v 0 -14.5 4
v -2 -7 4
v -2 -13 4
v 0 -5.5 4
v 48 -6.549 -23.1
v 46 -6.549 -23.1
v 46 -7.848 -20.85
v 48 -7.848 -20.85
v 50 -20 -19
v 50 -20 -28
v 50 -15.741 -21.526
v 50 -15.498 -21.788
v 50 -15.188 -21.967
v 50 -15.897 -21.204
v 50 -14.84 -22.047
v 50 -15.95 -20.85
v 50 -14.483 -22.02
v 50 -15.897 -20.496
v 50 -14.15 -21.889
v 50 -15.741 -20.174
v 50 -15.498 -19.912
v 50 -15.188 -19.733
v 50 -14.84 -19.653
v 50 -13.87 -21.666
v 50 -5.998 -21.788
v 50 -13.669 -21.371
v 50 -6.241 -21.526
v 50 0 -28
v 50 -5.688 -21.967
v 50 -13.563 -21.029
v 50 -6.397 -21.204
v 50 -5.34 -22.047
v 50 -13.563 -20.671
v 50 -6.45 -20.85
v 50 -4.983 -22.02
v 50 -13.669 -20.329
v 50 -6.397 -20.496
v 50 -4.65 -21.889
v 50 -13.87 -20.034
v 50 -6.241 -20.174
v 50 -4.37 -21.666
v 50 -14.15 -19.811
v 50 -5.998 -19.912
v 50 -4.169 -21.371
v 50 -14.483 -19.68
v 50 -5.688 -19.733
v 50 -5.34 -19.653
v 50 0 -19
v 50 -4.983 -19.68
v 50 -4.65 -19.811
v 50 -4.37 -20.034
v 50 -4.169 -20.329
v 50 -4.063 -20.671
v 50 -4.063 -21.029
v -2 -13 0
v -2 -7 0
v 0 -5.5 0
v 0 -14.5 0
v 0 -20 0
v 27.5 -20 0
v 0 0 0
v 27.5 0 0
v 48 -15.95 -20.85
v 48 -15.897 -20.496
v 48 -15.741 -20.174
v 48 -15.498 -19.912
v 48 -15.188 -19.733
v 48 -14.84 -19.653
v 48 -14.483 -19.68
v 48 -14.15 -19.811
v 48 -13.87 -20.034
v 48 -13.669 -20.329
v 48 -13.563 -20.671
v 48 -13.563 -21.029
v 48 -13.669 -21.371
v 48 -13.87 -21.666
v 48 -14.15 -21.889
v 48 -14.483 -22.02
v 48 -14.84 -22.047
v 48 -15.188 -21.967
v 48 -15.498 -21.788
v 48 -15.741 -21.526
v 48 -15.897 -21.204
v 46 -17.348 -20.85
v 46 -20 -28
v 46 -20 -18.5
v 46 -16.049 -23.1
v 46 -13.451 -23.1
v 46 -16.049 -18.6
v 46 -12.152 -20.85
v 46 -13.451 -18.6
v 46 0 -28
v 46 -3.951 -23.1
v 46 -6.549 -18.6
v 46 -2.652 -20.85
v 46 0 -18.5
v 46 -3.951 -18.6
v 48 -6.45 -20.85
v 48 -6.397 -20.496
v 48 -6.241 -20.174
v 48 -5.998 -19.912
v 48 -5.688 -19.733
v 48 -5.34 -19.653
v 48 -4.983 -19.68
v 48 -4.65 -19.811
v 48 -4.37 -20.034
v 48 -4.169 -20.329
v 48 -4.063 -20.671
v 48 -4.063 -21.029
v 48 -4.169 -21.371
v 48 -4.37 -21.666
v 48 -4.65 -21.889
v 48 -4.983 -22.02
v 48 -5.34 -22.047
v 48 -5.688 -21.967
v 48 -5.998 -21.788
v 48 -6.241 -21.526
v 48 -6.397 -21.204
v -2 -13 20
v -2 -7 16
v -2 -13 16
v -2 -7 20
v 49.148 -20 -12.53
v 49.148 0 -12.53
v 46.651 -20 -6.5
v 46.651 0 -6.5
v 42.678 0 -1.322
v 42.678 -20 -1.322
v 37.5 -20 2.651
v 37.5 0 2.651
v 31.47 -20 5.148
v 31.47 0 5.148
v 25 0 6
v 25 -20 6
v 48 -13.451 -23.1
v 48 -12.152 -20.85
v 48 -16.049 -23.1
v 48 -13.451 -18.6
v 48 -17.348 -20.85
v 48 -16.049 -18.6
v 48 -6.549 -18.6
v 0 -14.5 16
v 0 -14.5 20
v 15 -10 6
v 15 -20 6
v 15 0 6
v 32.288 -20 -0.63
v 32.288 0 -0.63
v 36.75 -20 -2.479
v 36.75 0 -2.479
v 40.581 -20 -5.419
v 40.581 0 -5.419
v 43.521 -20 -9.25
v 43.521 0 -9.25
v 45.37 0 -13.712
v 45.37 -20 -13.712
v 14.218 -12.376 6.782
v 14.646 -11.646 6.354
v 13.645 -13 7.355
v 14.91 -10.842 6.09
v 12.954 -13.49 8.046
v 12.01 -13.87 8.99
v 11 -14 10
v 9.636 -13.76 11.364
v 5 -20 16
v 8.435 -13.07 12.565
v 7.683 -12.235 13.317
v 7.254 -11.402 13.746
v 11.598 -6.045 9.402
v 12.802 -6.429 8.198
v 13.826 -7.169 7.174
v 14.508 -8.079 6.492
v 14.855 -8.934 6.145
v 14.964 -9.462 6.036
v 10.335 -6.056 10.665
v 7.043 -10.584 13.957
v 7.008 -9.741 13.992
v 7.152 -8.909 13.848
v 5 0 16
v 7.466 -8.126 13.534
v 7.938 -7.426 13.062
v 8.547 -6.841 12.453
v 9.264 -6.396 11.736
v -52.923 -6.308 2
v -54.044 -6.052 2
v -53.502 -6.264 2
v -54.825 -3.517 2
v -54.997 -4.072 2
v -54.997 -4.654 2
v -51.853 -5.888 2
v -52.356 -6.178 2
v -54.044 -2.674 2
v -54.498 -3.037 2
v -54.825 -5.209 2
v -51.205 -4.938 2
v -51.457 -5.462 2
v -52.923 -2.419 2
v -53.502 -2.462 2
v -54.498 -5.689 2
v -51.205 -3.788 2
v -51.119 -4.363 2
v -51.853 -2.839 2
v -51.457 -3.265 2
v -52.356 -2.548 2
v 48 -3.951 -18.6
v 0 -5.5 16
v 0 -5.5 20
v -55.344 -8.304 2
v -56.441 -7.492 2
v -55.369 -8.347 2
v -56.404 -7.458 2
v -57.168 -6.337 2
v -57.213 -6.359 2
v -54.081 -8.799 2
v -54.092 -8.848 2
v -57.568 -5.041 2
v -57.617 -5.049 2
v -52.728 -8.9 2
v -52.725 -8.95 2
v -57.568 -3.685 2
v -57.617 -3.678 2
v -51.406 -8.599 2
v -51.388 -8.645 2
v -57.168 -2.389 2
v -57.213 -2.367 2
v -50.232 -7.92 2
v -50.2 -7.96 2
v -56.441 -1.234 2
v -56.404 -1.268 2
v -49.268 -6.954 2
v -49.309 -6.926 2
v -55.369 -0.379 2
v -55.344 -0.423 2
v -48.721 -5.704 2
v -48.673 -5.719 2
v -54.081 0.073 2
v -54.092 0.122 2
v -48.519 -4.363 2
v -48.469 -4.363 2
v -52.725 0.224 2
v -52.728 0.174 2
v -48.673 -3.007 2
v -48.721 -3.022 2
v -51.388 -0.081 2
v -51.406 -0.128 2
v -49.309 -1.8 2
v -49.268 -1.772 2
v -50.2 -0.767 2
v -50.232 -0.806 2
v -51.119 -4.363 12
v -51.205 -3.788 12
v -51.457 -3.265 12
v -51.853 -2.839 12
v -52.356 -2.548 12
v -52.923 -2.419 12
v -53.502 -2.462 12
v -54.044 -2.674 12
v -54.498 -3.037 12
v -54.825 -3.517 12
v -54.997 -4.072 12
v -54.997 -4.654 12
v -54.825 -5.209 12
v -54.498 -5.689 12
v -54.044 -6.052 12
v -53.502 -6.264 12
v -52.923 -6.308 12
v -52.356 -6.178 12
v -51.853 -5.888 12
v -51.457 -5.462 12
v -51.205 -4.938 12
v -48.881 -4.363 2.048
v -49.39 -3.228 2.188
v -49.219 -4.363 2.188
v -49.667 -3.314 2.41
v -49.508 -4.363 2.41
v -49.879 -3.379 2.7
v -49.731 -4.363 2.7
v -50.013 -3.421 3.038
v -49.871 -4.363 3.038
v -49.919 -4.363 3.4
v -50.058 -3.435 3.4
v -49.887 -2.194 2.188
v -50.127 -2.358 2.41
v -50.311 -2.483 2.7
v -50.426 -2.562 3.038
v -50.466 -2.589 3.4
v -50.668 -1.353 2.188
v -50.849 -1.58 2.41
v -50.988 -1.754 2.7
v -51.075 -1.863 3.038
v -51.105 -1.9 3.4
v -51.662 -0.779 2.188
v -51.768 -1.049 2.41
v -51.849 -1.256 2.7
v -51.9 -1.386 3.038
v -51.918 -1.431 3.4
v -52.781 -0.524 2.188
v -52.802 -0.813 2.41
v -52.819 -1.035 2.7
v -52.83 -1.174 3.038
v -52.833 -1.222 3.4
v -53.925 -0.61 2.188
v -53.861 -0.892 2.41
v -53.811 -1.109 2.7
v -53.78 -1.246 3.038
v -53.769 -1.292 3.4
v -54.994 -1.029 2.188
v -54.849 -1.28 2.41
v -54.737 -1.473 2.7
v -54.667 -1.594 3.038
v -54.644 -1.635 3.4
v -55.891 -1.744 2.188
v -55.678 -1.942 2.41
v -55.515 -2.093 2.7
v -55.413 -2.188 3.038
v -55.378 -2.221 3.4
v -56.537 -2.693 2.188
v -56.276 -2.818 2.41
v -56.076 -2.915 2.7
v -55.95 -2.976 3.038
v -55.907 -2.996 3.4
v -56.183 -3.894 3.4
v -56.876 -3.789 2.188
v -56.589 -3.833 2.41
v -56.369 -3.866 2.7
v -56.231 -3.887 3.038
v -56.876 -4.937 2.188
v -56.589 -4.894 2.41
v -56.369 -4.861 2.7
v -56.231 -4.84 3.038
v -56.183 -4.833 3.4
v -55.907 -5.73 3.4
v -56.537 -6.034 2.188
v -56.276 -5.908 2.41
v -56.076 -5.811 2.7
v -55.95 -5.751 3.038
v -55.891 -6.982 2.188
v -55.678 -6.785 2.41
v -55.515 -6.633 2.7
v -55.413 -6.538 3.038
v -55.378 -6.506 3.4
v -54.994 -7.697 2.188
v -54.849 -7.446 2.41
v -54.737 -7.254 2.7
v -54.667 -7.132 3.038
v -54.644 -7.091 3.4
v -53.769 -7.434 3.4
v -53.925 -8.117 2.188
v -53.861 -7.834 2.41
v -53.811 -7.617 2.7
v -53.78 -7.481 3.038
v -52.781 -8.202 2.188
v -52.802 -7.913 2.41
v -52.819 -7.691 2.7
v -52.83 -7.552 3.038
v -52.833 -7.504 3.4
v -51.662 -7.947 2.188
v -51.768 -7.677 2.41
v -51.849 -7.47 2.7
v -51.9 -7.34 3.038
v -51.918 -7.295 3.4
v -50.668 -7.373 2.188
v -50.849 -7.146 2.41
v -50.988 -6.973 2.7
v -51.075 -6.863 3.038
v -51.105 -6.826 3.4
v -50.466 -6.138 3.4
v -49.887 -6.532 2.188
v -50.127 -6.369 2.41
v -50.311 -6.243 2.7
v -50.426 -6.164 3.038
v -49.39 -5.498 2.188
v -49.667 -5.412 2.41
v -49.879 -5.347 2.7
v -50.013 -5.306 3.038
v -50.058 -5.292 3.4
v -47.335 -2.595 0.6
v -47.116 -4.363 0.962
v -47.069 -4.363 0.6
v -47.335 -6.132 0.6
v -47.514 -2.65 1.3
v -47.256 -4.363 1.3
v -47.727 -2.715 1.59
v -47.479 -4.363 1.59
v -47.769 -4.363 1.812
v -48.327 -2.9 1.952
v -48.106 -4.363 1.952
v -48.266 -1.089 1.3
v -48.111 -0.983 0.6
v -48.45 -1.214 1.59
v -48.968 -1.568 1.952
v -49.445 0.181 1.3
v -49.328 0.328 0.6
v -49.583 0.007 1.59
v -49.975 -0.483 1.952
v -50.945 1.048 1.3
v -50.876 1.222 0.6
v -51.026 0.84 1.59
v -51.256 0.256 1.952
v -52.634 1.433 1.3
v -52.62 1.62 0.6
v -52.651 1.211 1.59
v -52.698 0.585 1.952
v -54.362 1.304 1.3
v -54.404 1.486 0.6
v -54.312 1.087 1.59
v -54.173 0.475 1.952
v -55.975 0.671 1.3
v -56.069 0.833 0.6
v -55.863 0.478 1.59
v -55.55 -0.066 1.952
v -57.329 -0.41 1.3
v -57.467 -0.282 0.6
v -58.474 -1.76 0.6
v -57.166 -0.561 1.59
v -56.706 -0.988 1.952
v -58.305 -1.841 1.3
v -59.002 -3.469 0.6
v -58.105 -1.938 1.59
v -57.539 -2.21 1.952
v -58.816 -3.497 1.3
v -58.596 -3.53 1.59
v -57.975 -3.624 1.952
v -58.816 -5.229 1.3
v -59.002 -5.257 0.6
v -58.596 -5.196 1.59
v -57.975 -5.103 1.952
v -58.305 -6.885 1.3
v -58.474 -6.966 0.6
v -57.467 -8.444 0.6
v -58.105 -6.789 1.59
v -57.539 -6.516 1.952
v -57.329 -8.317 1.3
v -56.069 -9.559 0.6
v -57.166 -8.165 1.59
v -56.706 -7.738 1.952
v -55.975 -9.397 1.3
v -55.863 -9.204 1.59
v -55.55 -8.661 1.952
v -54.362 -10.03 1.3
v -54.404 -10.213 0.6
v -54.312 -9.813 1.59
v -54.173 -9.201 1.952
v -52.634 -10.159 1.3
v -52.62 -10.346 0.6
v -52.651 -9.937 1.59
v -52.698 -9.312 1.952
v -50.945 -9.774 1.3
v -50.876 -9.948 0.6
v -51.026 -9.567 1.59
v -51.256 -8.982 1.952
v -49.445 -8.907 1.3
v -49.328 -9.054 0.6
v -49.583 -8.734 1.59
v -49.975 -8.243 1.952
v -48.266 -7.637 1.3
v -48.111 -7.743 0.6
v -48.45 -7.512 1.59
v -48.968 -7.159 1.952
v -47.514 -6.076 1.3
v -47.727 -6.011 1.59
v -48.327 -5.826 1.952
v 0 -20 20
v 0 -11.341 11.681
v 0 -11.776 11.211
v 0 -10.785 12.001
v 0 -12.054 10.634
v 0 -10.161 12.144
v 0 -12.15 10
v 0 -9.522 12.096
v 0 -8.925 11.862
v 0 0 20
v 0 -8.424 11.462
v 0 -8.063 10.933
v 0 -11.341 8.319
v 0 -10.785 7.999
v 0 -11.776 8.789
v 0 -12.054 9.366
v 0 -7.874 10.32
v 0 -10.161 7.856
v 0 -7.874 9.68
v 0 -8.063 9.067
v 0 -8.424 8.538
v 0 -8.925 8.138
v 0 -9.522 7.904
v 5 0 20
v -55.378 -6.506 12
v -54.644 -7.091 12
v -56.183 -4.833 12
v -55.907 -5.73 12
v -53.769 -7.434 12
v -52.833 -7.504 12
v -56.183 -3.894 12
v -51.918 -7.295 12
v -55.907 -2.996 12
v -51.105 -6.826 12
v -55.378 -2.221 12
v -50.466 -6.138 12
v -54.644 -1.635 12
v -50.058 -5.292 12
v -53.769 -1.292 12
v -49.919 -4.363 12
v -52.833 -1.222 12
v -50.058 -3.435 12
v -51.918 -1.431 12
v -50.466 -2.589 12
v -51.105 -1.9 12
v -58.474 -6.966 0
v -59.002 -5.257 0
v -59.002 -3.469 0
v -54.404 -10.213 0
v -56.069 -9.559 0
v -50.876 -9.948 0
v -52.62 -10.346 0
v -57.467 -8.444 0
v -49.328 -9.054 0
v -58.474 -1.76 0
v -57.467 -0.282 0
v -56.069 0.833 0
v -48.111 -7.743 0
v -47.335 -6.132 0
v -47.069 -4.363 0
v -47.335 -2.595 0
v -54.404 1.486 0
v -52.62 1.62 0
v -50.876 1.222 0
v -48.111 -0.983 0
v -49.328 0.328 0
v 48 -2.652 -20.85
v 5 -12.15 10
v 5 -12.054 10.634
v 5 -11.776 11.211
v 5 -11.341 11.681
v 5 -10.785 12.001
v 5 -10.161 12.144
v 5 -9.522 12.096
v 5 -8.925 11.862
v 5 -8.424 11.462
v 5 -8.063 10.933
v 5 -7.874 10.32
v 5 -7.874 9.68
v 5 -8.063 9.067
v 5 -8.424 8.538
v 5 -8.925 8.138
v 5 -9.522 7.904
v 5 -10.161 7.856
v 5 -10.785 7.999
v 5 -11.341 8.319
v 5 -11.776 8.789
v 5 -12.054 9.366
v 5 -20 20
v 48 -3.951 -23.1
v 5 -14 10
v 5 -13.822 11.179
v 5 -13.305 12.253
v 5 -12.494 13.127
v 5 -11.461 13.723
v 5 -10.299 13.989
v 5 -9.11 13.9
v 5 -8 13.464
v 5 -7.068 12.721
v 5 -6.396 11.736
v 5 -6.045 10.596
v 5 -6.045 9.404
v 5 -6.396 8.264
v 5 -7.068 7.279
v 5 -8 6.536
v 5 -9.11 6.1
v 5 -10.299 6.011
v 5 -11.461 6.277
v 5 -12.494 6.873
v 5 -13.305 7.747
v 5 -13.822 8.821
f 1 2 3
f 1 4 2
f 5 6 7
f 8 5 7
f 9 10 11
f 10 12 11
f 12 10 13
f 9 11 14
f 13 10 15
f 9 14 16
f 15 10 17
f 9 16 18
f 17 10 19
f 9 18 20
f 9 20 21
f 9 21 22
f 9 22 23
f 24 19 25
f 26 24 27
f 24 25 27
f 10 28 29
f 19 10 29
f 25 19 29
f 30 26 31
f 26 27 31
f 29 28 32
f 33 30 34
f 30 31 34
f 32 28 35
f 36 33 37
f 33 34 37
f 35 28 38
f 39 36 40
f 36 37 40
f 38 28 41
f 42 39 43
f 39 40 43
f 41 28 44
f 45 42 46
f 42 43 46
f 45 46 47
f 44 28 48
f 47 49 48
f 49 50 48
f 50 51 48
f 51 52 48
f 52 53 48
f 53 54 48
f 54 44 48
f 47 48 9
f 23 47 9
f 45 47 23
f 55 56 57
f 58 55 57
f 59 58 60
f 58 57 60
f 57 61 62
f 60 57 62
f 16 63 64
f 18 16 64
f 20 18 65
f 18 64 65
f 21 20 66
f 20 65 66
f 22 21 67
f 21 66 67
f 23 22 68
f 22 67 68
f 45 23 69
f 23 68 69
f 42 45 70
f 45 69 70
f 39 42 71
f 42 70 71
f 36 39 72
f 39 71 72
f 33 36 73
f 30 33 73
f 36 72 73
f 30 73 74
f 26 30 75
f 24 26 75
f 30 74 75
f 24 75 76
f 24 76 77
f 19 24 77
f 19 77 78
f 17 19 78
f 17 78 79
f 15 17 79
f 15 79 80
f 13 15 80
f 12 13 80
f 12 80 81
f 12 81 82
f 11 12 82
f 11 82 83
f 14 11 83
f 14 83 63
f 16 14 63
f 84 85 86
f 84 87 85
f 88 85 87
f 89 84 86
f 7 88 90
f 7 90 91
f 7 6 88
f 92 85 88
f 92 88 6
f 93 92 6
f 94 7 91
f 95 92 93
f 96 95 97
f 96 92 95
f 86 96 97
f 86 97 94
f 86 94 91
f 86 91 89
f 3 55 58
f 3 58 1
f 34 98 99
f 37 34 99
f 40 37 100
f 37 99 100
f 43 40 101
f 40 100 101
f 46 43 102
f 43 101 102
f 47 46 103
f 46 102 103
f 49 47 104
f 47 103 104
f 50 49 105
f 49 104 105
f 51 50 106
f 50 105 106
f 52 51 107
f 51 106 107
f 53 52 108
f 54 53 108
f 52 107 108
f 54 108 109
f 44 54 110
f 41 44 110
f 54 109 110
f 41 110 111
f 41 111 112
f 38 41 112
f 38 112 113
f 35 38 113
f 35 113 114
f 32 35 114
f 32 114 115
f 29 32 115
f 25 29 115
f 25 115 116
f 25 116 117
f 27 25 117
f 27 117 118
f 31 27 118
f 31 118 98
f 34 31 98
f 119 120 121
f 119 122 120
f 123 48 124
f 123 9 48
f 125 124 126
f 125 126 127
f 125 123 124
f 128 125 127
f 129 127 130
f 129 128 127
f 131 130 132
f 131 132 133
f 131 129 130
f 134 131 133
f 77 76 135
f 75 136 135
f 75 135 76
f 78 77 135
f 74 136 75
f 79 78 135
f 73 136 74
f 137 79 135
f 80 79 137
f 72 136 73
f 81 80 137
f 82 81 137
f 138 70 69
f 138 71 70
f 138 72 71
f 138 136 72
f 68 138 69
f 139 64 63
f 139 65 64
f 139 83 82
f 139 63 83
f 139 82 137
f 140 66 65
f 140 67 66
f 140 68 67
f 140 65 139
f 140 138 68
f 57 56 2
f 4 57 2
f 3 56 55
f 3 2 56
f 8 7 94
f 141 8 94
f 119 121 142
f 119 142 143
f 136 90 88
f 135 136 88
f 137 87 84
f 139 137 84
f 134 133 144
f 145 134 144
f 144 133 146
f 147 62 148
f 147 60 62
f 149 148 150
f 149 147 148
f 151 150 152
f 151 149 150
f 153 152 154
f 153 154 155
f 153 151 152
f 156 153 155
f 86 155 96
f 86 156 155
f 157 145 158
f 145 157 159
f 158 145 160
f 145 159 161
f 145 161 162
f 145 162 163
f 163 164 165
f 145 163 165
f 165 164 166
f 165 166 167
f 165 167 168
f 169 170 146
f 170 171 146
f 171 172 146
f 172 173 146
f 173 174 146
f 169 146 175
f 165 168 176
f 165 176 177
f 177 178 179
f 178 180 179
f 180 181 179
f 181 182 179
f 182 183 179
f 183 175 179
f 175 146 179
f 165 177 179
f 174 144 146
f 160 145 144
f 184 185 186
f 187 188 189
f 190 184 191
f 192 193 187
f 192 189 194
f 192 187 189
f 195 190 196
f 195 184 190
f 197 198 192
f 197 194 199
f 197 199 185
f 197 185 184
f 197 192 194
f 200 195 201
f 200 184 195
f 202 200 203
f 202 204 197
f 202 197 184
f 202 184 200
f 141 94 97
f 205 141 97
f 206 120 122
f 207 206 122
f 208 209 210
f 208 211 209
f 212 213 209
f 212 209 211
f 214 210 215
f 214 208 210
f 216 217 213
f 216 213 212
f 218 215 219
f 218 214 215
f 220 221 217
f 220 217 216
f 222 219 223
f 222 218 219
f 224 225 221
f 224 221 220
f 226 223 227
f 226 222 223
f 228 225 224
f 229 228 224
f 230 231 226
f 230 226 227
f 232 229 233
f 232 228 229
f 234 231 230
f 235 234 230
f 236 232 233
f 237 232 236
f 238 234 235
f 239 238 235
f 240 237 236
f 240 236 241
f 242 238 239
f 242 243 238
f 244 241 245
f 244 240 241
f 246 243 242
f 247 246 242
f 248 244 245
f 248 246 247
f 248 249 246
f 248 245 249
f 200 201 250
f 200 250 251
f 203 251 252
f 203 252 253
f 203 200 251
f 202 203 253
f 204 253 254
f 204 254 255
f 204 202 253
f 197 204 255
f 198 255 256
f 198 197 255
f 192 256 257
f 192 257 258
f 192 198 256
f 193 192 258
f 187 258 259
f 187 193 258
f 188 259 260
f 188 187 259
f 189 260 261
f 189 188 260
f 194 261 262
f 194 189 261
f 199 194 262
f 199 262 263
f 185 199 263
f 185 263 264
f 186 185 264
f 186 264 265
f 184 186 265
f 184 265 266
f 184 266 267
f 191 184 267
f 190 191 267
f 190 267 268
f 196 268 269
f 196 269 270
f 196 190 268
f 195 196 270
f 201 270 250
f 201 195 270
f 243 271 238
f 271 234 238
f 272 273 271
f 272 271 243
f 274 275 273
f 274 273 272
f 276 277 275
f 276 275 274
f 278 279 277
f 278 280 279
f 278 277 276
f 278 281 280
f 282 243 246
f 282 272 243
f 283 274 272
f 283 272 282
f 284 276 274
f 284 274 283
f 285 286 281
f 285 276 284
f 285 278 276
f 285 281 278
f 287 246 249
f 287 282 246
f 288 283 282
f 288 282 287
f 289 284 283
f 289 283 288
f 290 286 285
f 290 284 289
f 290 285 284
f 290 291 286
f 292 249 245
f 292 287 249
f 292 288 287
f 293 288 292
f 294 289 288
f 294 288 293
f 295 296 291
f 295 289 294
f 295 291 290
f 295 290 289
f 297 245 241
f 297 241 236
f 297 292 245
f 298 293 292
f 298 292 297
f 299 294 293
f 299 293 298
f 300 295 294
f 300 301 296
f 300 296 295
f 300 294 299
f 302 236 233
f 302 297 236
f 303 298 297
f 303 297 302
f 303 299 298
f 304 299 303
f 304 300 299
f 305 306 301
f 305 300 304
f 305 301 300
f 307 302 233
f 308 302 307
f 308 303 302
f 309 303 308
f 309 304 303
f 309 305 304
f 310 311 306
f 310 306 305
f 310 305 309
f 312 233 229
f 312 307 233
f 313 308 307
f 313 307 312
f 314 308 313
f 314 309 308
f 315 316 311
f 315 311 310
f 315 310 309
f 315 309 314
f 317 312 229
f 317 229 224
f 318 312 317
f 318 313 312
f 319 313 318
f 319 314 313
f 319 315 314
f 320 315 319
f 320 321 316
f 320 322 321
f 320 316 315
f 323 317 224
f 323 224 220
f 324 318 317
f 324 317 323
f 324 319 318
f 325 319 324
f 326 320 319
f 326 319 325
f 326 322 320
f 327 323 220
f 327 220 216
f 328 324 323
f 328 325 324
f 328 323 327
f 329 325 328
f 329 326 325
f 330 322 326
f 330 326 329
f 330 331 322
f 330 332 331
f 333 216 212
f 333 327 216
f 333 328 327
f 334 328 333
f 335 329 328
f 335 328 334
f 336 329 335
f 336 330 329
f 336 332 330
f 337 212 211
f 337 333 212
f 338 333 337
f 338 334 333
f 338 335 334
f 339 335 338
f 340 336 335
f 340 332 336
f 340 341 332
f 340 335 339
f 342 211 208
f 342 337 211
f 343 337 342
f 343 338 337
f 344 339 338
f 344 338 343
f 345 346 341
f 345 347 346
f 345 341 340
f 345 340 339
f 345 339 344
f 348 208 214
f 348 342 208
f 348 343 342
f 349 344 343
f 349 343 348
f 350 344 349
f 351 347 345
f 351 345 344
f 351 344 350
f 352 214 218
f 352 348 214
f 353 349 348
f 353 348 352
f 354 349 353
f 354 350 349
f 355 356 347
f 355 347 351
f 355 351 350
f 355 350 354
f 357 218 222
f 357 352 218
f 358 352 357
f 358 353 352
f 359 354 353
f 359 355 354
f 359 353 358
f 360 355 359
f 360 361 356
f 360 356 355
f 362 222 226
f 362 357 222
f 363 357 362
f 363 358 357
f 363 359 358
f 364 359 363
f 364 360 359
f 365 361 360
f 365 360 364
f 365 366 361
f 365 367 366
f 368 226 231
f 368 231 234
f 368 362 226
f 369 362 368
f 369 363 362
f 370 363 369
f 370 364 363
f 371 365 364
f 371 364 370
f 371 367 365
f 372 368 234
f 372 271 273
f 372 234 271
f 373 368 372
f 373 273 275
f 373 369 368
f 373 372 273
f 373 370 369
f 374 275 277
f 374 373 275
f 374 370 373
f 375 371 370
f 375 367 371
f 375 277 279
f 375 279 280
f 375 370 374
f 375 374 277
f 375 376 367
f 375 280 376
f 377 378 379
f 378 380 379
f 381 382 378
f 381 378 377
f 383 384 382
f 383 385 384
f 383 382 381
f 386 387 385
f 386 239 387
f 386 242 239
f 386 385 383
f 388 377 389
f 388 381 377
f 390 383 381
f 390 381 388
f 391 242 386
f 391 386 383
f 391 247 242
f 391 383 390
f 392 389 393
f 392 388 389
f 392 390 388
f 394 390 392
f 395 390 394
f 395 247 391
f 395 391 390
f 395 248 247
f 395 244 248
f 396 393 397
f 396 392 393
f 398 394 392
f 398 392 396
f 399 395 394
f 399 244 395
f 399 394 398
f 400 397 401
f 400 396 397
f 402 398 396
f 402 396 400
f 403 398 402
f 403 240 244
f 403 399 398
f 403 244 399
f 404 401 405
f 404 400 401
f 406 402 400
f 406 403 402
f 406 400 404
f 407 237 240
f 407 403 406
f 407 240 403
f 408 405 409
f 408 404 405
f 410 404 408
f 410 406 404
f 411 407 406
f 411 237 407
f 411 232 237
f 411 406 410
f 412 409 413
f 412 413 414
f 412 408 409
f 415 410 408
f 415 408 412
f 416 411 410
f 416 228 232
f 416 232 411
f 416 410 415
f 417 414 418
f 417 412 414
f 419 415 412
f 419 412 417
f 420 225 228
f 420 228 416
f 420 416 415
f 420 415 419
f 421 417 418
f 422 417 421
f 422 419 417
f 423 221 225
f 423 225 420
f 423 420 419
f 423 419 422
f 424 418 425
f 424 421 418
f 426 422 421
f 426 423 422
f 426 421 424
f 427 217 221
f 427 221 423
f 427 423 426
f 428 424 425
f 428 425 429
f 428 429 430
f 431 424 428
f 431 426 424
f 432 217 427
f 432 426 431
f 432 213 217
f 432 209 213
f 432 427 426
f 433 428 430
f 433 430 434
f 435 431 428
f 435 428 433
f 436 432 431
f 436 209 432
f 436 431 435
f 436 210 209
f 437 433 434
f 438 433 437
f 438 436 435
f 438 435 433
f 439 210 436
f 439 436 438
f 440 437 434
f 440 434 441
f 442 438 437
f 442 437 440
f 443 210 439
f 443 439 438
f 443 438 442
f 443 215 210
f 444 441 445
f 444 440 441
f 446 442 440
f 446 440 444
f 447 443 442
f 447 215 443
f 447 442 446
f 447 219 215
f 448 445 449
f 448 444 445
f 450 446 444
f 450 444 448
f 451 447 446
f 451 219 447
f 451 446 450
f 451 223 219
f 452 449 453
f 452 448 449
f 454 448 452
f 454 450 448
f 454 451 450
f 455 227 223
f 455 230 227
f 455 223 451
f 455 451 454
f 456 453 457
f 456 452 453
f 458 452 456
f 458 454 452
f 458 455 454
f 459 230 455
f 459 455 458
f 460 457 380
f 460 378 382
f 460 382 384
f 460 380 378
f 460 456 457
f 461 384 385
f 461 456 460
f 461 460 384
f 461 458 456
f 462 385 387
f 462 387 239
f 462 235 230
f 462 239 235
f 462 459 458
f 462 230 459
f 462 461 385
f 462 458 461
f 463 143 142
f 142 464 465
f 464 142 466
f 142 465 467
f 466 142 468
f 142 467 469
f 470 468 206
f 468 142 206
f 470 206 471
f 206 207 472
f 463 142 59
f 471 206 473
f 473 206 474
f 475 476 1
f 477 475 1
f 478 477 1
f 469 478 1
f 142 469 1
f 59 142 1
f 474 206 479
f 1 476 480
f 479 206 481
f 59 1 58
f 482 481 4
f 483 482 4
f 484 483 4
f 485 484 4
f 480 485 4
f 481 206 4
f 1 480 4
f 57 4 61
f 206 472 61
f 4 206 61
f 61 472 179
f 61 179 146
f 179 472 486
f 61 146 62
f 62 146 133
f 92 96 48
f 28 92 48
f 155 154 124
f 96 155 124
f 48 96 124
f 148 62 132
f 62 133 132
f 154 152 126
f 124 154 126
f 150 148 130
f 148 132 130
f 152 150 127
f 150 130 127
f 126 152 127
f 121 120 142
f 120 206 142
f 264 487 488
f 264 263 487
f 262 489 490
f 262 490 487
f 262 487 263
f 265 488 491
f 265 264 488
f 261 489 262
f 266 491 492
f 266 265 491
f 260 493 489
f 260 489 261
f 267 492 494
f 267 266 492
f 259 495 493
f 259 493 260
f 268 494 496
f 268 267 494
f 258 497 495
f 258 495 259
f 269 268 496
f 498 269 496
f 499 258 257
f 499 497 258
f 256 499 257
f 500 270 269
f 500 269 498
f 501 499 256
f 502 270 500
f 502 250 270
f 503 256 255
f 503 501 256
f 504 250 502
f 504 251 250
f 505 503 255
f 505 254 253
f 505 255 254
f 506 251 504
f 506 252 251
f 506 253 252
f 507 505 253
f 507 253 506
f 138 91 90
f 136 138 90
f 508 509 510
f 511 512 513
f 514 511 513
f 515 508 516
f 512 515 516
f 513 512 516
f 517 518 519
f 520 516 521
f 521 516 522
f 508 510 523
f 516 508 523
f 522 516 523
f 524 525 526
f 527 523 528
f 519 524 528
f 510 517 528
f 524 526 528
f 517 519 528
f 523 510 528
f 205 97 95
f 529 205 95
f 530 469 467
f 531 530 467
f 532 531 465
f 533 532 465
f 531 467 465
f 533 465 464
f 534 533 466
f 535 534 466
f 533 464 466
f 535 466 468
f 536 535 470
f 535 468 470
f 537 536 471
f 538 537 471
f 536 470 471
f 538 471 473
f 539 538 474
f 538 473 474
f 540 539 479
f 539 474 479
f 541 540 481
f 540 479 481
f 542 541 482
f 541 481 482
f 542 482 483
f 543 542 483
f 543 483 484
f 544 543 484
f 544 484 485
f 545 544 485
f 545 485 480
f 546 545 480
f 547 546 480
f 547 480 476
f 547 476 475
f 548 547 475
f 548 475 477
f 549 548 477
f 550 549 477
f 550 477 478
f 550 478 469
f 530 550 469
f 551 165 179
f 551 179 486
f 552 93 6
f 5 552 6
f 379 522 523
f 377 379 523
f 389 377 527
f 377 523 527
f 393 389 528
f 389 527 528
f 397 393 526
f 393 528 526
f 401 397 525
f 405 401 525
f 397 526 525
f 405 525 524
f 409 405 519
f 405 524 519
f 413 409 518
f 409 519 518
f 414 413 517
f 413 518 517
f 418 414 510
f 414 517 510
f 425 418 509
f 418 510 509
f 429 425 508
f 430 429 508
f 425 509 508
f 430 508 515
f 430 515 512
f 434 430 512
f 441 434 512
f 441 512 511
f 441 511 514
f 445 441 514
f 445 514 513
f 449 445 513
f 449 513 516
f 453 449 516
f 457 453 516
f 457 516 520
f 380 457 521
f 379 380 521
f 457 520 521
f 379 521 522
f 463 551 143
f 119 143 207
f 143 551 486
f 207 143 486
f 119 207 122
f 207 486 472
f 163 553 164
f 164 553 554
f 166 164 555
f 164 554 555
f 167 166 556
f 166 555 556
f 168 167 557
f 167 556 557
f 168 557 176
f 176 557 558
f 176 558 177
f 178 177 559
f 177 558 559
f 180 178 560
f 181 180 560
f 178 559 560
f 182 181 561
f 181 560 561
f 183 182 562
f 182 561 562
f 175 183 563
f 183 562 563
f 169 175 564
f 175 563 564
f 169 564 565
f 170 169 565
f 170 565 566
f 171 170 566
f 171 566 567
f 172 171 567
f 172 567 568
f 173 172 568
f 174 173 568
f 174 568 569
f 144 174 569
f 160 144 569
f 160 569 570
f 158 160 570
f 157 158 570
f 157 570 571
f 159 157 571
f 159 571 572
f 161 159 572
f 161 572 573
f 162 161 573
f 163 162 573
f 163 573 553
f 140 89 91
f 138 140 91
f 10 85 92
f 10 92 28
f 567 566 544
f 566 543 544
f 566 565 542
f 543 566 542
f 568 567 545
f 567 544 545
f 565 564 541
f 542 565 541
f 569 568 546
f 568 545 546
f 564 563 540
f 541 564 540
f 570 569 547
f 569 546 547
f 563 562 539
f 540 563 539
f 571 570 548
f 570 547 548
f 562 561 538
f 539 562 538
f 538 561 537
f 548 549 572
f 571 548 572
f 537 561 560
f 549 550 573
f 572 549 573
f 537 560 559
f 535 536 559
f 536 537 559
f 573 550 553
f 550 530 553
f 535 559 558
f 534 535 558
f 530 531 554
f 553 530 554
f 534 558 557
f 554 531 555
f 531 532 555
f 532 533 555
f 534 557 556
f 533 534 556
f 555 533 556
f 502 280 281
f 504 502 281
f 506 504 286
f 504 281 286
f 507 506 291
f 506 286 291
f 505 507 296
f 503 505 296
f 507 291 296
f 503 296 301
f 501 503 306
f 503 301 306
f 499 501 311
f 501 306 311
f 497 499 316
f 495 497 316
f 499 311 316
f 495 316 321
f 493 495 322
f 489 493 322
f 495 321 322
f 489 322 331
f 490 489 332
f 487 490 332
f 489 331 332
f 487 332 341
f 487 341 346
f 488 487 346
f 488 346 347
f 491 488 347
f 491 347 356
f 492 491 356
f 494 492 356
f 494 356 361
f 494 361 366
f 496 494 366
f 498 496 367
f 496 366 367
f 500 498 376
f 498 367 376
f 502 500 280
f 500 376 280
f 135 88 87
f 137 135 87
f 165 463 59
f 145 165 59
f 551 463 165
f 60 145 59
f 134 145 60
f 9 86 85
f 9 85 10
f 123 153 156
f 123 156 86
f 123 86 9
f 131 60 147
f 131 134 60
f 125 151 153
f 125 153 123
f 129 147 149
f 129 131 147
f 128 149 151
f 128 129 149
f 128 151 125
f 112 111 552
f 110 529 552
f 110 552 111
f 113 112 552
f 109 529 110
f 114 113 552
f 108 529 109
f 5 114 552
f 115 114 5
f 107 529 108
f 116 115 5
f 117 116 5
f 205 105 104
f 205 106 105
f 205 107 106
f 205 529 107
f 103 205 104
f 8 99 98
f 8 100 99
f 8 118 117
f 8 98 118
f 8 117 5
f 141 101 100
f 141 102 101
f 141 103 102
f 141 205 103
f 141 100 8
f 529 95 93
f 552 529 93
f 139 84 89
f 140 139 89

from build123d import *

# Parameters (mm, degrees)
F0_W       = 4
F0_H       = 28
F1_DEPTH   = 20
F2_R       = 2.15
F3_DEPTH   = 50.001
F4_START   = -5
F2_R_2     = 4
F4_DEPTH   = 45.001
F6_D       = 2.4
F6_DEPTH   = 8
F6_TIP     = 0.7210327428
F2_W       = 9
F2_H       = 4
F7_DEPTH   = 2
F8_SIZE2   = 1.49999
F8_SIZE    = 1.99999
F8_2_SIZE2 = 1.49999
F8_2_SIZE  = 1.99999
F9_SIZE2   = 1.49999
F9_SIZE    = 1.99999
F9_2_SIZE2 = 1.49999
F9_2_SIZE  = 1.99999
F11_DEPTH  = 2
F12_R      = 18.5
F13_R      = 25
F14_R      = 6
F15_DEPTH  = 2
F16_R      = 3.15
F16_R_2    = 1.95
F17_DEPTH  = 10
F18_R      = 1.4


# Not quite as in the source:
# - a fillet or chamfer is up to 0.001 mm smaller than in the source, because OpenCascade refuses the exact size
# - a feature names something its author has since deleted; it is built from what else it names


with BuildPart() as f1:
    # F0 (on Front) → F1 (new body)
    with BuildSketch(Plane.XZ):
        Polygon((0, 20), (0, 0), (46, 0), (50, 0), (50, 6), (15, 6), (5, 16), (5, 20), align=None)
        with Locations((48, -14)):
            Rectangle(F0_W, F0_H)
    extrude(amount=F1_DEPTH)

    # F2 (on face) → F3 (cut, through all)
    with BuildSketch(Plane(origin=(0, 0, 0), x_dir=(0, -1, 0), z_dir=(-1, 0, 0))):
        with Locations((10, 10)):
            Circle(F2_R)
    extrude(amount=-F3_DEPTH, mode=Mode.SUBTRACT)

    # F2 (on face) → F4 (cut)
    with BuildSketch(Plane(origin=(0, 0, 0), x_dir=(0, -1, 0), z_dir=(-1, 0, 0)).offset(F4_START)):
        with Locations((10, 10)):
            Circle(F2_R_2)
        with Locations((10, 10)):
            Circle(F2_R, mode=Mode.SUBTRACT)
    extrude(amount=-F4_DEPTH, mode=Mode.SUBTRACT)

    # F6
    with Locations(Plane.YZ.offset(50)):
        with Locations((-14.75, -20.85), (-5.25, -20.85)):
            Hole(F6_D / 2, depth=F6_DEPTH)
            with Locations((0, 0, -(F6_DEPTH + F6_TIP / 2))):  # 118° drill point
                Cone(0, F6_D / 2, F6_TIP, mode=Mode.SUBTRACT)

    # F2 (on face) → F7 (join)
    with BuildSketch(Plane(origin=(0, 0, 0), x_dir=(0, -1, 0), z_dir=(-1, 0, 0))):
        with Locations((10, 2)):
            Rectangle(F2_W, F2_H)
        with Locations((10, 18)):
            Rectangle(F2_W, F2_H)
    extrude(amount=F7_DEPTH)

    # F8 (size 2 and 1.5 in the source; OpenCascade refuses exactly that, so slightly less here)
    f8_edges = [f1.edges().sort_by_distance(p)[0] for p in [
        (-2, -5.5, 2),
    ]]
    f8_side = f1.faces().sort_by_distance((-1, -5.5, 2))[0]
    chamfer(f8_edges, length=F8_SIZE, length2=F8_SIZE2, reference=f8_side)

    # F8#2 (size 2 and 1.5 in the source; OpenCascade refuses exactly that, so slightly less here)
    f8_2_edges = [f1.edges().sort_by_distance(p)[0] for p in [
        (-2, -14.5, 2),
    ]]
    f8_2_side = f1.faces().sort_by_distance((-1, -14.5, 2))[0]
    chamfer(f8_2_edges, length=F8_2_SIZE, length2=F8_2_SIZE2, reference=f8_2_side)

    # F9 (size 2 and 1.5 in the source; OpenCascade refuses exactly that, so slightly less here)
    f9_edges = [f1.edges().sort_by_distance(p)[0] for p in [
        (-2, -14.5, 18),
    ]]
    f9_side = f1.faces().sort_by_distance((-1, -14.5, 18))[0]
    chamfer(f9_edges, length=F9_SIZE, length2=F9_SIZE2, reference=f9_side)

    # F9#2 (size 2 and 1.5 in the source; OpenCascade refuses exactly that, so slightly less here)
    f9_2_edges = [f1.edges().sort_by_distance(p)[0] for p in [
        (-2, -5.5, 18),
    ]]
    f9_2_side = f1.faces().sort_by_distance((-1, -5.5, 18))[0]
    chamfer(f9_2_edges, length=F9_2_SIZE, length2=F9_2_SIZE2, reference=f9_2_side)

    # F10 (on face) → F11 (cut)
    with BuildSketch(Plane(origin=(46, 0, 0), x_dir=(0, -1, 0), z_dir=(-1, 0, 0))):
        Polygon((6.5490381057, -23.1), (7.8480762114, -20.85), (6.5490381057, -18.6), (3.9509618943, -18.6), (2.6519237886, -20.85), (3.9509618943, -23.1), align=None)
        Polygon((12.1519237886, -20.85), (13.4509618943, -23.1), (16.0490381057, -23.1), (17.3480762114, -20.85), (16.0490381057, -18.6), (13.4509618943, -18.6), align=None)
    extrude(amount=-F11_DEPTH, mode=Mode.SUBTRACT)

    # F12
    f12_edges = [f1.edges().sort_by_distance(p)[0] for p in [
        (46, -10, 0),
    ]]
    fillet(f12_edges, radius=F12_R)

    # F13
    f13_edges = [f1.edges().sort_by_distance(p)[0] for p in [
        (50, -10, 6),
    ]]
    fillet(f13_edges, radius=F13_R)


with BuildPart() as f15:
    # F14 (on Top) → F15 (new body)
    with BuildSketch(Plane.XY):
        with Locations((-53.0685186386, -4.3631289154)):
            Circle(F14_R)
    extrude(amount=F15_DEPTH)

    # F16 (on face) → F17 (join)
    with BuildSketch(Plane.XY.offset(2)):
        with Locations((-53.0685186386, -4.3631289154)):
            Circle(F16_R)
        with Locations((-53.0685186386, -4.3631289154)):
            Circle(F16_R_2, mode=Mode.SUBTRACT)
    extrude(amount=F17_DEPTH)

    # F18
    f18_edges = [f15.edges().sort_by_distance(p)[0] for p in [
        (-56.218519, -4.363129, 2),
        (-59.068519, -4.363129, 2),
    ]]
    fillet(f18_edges, radius=F18_R)


solid = Compound([f1.part, f15.part])
